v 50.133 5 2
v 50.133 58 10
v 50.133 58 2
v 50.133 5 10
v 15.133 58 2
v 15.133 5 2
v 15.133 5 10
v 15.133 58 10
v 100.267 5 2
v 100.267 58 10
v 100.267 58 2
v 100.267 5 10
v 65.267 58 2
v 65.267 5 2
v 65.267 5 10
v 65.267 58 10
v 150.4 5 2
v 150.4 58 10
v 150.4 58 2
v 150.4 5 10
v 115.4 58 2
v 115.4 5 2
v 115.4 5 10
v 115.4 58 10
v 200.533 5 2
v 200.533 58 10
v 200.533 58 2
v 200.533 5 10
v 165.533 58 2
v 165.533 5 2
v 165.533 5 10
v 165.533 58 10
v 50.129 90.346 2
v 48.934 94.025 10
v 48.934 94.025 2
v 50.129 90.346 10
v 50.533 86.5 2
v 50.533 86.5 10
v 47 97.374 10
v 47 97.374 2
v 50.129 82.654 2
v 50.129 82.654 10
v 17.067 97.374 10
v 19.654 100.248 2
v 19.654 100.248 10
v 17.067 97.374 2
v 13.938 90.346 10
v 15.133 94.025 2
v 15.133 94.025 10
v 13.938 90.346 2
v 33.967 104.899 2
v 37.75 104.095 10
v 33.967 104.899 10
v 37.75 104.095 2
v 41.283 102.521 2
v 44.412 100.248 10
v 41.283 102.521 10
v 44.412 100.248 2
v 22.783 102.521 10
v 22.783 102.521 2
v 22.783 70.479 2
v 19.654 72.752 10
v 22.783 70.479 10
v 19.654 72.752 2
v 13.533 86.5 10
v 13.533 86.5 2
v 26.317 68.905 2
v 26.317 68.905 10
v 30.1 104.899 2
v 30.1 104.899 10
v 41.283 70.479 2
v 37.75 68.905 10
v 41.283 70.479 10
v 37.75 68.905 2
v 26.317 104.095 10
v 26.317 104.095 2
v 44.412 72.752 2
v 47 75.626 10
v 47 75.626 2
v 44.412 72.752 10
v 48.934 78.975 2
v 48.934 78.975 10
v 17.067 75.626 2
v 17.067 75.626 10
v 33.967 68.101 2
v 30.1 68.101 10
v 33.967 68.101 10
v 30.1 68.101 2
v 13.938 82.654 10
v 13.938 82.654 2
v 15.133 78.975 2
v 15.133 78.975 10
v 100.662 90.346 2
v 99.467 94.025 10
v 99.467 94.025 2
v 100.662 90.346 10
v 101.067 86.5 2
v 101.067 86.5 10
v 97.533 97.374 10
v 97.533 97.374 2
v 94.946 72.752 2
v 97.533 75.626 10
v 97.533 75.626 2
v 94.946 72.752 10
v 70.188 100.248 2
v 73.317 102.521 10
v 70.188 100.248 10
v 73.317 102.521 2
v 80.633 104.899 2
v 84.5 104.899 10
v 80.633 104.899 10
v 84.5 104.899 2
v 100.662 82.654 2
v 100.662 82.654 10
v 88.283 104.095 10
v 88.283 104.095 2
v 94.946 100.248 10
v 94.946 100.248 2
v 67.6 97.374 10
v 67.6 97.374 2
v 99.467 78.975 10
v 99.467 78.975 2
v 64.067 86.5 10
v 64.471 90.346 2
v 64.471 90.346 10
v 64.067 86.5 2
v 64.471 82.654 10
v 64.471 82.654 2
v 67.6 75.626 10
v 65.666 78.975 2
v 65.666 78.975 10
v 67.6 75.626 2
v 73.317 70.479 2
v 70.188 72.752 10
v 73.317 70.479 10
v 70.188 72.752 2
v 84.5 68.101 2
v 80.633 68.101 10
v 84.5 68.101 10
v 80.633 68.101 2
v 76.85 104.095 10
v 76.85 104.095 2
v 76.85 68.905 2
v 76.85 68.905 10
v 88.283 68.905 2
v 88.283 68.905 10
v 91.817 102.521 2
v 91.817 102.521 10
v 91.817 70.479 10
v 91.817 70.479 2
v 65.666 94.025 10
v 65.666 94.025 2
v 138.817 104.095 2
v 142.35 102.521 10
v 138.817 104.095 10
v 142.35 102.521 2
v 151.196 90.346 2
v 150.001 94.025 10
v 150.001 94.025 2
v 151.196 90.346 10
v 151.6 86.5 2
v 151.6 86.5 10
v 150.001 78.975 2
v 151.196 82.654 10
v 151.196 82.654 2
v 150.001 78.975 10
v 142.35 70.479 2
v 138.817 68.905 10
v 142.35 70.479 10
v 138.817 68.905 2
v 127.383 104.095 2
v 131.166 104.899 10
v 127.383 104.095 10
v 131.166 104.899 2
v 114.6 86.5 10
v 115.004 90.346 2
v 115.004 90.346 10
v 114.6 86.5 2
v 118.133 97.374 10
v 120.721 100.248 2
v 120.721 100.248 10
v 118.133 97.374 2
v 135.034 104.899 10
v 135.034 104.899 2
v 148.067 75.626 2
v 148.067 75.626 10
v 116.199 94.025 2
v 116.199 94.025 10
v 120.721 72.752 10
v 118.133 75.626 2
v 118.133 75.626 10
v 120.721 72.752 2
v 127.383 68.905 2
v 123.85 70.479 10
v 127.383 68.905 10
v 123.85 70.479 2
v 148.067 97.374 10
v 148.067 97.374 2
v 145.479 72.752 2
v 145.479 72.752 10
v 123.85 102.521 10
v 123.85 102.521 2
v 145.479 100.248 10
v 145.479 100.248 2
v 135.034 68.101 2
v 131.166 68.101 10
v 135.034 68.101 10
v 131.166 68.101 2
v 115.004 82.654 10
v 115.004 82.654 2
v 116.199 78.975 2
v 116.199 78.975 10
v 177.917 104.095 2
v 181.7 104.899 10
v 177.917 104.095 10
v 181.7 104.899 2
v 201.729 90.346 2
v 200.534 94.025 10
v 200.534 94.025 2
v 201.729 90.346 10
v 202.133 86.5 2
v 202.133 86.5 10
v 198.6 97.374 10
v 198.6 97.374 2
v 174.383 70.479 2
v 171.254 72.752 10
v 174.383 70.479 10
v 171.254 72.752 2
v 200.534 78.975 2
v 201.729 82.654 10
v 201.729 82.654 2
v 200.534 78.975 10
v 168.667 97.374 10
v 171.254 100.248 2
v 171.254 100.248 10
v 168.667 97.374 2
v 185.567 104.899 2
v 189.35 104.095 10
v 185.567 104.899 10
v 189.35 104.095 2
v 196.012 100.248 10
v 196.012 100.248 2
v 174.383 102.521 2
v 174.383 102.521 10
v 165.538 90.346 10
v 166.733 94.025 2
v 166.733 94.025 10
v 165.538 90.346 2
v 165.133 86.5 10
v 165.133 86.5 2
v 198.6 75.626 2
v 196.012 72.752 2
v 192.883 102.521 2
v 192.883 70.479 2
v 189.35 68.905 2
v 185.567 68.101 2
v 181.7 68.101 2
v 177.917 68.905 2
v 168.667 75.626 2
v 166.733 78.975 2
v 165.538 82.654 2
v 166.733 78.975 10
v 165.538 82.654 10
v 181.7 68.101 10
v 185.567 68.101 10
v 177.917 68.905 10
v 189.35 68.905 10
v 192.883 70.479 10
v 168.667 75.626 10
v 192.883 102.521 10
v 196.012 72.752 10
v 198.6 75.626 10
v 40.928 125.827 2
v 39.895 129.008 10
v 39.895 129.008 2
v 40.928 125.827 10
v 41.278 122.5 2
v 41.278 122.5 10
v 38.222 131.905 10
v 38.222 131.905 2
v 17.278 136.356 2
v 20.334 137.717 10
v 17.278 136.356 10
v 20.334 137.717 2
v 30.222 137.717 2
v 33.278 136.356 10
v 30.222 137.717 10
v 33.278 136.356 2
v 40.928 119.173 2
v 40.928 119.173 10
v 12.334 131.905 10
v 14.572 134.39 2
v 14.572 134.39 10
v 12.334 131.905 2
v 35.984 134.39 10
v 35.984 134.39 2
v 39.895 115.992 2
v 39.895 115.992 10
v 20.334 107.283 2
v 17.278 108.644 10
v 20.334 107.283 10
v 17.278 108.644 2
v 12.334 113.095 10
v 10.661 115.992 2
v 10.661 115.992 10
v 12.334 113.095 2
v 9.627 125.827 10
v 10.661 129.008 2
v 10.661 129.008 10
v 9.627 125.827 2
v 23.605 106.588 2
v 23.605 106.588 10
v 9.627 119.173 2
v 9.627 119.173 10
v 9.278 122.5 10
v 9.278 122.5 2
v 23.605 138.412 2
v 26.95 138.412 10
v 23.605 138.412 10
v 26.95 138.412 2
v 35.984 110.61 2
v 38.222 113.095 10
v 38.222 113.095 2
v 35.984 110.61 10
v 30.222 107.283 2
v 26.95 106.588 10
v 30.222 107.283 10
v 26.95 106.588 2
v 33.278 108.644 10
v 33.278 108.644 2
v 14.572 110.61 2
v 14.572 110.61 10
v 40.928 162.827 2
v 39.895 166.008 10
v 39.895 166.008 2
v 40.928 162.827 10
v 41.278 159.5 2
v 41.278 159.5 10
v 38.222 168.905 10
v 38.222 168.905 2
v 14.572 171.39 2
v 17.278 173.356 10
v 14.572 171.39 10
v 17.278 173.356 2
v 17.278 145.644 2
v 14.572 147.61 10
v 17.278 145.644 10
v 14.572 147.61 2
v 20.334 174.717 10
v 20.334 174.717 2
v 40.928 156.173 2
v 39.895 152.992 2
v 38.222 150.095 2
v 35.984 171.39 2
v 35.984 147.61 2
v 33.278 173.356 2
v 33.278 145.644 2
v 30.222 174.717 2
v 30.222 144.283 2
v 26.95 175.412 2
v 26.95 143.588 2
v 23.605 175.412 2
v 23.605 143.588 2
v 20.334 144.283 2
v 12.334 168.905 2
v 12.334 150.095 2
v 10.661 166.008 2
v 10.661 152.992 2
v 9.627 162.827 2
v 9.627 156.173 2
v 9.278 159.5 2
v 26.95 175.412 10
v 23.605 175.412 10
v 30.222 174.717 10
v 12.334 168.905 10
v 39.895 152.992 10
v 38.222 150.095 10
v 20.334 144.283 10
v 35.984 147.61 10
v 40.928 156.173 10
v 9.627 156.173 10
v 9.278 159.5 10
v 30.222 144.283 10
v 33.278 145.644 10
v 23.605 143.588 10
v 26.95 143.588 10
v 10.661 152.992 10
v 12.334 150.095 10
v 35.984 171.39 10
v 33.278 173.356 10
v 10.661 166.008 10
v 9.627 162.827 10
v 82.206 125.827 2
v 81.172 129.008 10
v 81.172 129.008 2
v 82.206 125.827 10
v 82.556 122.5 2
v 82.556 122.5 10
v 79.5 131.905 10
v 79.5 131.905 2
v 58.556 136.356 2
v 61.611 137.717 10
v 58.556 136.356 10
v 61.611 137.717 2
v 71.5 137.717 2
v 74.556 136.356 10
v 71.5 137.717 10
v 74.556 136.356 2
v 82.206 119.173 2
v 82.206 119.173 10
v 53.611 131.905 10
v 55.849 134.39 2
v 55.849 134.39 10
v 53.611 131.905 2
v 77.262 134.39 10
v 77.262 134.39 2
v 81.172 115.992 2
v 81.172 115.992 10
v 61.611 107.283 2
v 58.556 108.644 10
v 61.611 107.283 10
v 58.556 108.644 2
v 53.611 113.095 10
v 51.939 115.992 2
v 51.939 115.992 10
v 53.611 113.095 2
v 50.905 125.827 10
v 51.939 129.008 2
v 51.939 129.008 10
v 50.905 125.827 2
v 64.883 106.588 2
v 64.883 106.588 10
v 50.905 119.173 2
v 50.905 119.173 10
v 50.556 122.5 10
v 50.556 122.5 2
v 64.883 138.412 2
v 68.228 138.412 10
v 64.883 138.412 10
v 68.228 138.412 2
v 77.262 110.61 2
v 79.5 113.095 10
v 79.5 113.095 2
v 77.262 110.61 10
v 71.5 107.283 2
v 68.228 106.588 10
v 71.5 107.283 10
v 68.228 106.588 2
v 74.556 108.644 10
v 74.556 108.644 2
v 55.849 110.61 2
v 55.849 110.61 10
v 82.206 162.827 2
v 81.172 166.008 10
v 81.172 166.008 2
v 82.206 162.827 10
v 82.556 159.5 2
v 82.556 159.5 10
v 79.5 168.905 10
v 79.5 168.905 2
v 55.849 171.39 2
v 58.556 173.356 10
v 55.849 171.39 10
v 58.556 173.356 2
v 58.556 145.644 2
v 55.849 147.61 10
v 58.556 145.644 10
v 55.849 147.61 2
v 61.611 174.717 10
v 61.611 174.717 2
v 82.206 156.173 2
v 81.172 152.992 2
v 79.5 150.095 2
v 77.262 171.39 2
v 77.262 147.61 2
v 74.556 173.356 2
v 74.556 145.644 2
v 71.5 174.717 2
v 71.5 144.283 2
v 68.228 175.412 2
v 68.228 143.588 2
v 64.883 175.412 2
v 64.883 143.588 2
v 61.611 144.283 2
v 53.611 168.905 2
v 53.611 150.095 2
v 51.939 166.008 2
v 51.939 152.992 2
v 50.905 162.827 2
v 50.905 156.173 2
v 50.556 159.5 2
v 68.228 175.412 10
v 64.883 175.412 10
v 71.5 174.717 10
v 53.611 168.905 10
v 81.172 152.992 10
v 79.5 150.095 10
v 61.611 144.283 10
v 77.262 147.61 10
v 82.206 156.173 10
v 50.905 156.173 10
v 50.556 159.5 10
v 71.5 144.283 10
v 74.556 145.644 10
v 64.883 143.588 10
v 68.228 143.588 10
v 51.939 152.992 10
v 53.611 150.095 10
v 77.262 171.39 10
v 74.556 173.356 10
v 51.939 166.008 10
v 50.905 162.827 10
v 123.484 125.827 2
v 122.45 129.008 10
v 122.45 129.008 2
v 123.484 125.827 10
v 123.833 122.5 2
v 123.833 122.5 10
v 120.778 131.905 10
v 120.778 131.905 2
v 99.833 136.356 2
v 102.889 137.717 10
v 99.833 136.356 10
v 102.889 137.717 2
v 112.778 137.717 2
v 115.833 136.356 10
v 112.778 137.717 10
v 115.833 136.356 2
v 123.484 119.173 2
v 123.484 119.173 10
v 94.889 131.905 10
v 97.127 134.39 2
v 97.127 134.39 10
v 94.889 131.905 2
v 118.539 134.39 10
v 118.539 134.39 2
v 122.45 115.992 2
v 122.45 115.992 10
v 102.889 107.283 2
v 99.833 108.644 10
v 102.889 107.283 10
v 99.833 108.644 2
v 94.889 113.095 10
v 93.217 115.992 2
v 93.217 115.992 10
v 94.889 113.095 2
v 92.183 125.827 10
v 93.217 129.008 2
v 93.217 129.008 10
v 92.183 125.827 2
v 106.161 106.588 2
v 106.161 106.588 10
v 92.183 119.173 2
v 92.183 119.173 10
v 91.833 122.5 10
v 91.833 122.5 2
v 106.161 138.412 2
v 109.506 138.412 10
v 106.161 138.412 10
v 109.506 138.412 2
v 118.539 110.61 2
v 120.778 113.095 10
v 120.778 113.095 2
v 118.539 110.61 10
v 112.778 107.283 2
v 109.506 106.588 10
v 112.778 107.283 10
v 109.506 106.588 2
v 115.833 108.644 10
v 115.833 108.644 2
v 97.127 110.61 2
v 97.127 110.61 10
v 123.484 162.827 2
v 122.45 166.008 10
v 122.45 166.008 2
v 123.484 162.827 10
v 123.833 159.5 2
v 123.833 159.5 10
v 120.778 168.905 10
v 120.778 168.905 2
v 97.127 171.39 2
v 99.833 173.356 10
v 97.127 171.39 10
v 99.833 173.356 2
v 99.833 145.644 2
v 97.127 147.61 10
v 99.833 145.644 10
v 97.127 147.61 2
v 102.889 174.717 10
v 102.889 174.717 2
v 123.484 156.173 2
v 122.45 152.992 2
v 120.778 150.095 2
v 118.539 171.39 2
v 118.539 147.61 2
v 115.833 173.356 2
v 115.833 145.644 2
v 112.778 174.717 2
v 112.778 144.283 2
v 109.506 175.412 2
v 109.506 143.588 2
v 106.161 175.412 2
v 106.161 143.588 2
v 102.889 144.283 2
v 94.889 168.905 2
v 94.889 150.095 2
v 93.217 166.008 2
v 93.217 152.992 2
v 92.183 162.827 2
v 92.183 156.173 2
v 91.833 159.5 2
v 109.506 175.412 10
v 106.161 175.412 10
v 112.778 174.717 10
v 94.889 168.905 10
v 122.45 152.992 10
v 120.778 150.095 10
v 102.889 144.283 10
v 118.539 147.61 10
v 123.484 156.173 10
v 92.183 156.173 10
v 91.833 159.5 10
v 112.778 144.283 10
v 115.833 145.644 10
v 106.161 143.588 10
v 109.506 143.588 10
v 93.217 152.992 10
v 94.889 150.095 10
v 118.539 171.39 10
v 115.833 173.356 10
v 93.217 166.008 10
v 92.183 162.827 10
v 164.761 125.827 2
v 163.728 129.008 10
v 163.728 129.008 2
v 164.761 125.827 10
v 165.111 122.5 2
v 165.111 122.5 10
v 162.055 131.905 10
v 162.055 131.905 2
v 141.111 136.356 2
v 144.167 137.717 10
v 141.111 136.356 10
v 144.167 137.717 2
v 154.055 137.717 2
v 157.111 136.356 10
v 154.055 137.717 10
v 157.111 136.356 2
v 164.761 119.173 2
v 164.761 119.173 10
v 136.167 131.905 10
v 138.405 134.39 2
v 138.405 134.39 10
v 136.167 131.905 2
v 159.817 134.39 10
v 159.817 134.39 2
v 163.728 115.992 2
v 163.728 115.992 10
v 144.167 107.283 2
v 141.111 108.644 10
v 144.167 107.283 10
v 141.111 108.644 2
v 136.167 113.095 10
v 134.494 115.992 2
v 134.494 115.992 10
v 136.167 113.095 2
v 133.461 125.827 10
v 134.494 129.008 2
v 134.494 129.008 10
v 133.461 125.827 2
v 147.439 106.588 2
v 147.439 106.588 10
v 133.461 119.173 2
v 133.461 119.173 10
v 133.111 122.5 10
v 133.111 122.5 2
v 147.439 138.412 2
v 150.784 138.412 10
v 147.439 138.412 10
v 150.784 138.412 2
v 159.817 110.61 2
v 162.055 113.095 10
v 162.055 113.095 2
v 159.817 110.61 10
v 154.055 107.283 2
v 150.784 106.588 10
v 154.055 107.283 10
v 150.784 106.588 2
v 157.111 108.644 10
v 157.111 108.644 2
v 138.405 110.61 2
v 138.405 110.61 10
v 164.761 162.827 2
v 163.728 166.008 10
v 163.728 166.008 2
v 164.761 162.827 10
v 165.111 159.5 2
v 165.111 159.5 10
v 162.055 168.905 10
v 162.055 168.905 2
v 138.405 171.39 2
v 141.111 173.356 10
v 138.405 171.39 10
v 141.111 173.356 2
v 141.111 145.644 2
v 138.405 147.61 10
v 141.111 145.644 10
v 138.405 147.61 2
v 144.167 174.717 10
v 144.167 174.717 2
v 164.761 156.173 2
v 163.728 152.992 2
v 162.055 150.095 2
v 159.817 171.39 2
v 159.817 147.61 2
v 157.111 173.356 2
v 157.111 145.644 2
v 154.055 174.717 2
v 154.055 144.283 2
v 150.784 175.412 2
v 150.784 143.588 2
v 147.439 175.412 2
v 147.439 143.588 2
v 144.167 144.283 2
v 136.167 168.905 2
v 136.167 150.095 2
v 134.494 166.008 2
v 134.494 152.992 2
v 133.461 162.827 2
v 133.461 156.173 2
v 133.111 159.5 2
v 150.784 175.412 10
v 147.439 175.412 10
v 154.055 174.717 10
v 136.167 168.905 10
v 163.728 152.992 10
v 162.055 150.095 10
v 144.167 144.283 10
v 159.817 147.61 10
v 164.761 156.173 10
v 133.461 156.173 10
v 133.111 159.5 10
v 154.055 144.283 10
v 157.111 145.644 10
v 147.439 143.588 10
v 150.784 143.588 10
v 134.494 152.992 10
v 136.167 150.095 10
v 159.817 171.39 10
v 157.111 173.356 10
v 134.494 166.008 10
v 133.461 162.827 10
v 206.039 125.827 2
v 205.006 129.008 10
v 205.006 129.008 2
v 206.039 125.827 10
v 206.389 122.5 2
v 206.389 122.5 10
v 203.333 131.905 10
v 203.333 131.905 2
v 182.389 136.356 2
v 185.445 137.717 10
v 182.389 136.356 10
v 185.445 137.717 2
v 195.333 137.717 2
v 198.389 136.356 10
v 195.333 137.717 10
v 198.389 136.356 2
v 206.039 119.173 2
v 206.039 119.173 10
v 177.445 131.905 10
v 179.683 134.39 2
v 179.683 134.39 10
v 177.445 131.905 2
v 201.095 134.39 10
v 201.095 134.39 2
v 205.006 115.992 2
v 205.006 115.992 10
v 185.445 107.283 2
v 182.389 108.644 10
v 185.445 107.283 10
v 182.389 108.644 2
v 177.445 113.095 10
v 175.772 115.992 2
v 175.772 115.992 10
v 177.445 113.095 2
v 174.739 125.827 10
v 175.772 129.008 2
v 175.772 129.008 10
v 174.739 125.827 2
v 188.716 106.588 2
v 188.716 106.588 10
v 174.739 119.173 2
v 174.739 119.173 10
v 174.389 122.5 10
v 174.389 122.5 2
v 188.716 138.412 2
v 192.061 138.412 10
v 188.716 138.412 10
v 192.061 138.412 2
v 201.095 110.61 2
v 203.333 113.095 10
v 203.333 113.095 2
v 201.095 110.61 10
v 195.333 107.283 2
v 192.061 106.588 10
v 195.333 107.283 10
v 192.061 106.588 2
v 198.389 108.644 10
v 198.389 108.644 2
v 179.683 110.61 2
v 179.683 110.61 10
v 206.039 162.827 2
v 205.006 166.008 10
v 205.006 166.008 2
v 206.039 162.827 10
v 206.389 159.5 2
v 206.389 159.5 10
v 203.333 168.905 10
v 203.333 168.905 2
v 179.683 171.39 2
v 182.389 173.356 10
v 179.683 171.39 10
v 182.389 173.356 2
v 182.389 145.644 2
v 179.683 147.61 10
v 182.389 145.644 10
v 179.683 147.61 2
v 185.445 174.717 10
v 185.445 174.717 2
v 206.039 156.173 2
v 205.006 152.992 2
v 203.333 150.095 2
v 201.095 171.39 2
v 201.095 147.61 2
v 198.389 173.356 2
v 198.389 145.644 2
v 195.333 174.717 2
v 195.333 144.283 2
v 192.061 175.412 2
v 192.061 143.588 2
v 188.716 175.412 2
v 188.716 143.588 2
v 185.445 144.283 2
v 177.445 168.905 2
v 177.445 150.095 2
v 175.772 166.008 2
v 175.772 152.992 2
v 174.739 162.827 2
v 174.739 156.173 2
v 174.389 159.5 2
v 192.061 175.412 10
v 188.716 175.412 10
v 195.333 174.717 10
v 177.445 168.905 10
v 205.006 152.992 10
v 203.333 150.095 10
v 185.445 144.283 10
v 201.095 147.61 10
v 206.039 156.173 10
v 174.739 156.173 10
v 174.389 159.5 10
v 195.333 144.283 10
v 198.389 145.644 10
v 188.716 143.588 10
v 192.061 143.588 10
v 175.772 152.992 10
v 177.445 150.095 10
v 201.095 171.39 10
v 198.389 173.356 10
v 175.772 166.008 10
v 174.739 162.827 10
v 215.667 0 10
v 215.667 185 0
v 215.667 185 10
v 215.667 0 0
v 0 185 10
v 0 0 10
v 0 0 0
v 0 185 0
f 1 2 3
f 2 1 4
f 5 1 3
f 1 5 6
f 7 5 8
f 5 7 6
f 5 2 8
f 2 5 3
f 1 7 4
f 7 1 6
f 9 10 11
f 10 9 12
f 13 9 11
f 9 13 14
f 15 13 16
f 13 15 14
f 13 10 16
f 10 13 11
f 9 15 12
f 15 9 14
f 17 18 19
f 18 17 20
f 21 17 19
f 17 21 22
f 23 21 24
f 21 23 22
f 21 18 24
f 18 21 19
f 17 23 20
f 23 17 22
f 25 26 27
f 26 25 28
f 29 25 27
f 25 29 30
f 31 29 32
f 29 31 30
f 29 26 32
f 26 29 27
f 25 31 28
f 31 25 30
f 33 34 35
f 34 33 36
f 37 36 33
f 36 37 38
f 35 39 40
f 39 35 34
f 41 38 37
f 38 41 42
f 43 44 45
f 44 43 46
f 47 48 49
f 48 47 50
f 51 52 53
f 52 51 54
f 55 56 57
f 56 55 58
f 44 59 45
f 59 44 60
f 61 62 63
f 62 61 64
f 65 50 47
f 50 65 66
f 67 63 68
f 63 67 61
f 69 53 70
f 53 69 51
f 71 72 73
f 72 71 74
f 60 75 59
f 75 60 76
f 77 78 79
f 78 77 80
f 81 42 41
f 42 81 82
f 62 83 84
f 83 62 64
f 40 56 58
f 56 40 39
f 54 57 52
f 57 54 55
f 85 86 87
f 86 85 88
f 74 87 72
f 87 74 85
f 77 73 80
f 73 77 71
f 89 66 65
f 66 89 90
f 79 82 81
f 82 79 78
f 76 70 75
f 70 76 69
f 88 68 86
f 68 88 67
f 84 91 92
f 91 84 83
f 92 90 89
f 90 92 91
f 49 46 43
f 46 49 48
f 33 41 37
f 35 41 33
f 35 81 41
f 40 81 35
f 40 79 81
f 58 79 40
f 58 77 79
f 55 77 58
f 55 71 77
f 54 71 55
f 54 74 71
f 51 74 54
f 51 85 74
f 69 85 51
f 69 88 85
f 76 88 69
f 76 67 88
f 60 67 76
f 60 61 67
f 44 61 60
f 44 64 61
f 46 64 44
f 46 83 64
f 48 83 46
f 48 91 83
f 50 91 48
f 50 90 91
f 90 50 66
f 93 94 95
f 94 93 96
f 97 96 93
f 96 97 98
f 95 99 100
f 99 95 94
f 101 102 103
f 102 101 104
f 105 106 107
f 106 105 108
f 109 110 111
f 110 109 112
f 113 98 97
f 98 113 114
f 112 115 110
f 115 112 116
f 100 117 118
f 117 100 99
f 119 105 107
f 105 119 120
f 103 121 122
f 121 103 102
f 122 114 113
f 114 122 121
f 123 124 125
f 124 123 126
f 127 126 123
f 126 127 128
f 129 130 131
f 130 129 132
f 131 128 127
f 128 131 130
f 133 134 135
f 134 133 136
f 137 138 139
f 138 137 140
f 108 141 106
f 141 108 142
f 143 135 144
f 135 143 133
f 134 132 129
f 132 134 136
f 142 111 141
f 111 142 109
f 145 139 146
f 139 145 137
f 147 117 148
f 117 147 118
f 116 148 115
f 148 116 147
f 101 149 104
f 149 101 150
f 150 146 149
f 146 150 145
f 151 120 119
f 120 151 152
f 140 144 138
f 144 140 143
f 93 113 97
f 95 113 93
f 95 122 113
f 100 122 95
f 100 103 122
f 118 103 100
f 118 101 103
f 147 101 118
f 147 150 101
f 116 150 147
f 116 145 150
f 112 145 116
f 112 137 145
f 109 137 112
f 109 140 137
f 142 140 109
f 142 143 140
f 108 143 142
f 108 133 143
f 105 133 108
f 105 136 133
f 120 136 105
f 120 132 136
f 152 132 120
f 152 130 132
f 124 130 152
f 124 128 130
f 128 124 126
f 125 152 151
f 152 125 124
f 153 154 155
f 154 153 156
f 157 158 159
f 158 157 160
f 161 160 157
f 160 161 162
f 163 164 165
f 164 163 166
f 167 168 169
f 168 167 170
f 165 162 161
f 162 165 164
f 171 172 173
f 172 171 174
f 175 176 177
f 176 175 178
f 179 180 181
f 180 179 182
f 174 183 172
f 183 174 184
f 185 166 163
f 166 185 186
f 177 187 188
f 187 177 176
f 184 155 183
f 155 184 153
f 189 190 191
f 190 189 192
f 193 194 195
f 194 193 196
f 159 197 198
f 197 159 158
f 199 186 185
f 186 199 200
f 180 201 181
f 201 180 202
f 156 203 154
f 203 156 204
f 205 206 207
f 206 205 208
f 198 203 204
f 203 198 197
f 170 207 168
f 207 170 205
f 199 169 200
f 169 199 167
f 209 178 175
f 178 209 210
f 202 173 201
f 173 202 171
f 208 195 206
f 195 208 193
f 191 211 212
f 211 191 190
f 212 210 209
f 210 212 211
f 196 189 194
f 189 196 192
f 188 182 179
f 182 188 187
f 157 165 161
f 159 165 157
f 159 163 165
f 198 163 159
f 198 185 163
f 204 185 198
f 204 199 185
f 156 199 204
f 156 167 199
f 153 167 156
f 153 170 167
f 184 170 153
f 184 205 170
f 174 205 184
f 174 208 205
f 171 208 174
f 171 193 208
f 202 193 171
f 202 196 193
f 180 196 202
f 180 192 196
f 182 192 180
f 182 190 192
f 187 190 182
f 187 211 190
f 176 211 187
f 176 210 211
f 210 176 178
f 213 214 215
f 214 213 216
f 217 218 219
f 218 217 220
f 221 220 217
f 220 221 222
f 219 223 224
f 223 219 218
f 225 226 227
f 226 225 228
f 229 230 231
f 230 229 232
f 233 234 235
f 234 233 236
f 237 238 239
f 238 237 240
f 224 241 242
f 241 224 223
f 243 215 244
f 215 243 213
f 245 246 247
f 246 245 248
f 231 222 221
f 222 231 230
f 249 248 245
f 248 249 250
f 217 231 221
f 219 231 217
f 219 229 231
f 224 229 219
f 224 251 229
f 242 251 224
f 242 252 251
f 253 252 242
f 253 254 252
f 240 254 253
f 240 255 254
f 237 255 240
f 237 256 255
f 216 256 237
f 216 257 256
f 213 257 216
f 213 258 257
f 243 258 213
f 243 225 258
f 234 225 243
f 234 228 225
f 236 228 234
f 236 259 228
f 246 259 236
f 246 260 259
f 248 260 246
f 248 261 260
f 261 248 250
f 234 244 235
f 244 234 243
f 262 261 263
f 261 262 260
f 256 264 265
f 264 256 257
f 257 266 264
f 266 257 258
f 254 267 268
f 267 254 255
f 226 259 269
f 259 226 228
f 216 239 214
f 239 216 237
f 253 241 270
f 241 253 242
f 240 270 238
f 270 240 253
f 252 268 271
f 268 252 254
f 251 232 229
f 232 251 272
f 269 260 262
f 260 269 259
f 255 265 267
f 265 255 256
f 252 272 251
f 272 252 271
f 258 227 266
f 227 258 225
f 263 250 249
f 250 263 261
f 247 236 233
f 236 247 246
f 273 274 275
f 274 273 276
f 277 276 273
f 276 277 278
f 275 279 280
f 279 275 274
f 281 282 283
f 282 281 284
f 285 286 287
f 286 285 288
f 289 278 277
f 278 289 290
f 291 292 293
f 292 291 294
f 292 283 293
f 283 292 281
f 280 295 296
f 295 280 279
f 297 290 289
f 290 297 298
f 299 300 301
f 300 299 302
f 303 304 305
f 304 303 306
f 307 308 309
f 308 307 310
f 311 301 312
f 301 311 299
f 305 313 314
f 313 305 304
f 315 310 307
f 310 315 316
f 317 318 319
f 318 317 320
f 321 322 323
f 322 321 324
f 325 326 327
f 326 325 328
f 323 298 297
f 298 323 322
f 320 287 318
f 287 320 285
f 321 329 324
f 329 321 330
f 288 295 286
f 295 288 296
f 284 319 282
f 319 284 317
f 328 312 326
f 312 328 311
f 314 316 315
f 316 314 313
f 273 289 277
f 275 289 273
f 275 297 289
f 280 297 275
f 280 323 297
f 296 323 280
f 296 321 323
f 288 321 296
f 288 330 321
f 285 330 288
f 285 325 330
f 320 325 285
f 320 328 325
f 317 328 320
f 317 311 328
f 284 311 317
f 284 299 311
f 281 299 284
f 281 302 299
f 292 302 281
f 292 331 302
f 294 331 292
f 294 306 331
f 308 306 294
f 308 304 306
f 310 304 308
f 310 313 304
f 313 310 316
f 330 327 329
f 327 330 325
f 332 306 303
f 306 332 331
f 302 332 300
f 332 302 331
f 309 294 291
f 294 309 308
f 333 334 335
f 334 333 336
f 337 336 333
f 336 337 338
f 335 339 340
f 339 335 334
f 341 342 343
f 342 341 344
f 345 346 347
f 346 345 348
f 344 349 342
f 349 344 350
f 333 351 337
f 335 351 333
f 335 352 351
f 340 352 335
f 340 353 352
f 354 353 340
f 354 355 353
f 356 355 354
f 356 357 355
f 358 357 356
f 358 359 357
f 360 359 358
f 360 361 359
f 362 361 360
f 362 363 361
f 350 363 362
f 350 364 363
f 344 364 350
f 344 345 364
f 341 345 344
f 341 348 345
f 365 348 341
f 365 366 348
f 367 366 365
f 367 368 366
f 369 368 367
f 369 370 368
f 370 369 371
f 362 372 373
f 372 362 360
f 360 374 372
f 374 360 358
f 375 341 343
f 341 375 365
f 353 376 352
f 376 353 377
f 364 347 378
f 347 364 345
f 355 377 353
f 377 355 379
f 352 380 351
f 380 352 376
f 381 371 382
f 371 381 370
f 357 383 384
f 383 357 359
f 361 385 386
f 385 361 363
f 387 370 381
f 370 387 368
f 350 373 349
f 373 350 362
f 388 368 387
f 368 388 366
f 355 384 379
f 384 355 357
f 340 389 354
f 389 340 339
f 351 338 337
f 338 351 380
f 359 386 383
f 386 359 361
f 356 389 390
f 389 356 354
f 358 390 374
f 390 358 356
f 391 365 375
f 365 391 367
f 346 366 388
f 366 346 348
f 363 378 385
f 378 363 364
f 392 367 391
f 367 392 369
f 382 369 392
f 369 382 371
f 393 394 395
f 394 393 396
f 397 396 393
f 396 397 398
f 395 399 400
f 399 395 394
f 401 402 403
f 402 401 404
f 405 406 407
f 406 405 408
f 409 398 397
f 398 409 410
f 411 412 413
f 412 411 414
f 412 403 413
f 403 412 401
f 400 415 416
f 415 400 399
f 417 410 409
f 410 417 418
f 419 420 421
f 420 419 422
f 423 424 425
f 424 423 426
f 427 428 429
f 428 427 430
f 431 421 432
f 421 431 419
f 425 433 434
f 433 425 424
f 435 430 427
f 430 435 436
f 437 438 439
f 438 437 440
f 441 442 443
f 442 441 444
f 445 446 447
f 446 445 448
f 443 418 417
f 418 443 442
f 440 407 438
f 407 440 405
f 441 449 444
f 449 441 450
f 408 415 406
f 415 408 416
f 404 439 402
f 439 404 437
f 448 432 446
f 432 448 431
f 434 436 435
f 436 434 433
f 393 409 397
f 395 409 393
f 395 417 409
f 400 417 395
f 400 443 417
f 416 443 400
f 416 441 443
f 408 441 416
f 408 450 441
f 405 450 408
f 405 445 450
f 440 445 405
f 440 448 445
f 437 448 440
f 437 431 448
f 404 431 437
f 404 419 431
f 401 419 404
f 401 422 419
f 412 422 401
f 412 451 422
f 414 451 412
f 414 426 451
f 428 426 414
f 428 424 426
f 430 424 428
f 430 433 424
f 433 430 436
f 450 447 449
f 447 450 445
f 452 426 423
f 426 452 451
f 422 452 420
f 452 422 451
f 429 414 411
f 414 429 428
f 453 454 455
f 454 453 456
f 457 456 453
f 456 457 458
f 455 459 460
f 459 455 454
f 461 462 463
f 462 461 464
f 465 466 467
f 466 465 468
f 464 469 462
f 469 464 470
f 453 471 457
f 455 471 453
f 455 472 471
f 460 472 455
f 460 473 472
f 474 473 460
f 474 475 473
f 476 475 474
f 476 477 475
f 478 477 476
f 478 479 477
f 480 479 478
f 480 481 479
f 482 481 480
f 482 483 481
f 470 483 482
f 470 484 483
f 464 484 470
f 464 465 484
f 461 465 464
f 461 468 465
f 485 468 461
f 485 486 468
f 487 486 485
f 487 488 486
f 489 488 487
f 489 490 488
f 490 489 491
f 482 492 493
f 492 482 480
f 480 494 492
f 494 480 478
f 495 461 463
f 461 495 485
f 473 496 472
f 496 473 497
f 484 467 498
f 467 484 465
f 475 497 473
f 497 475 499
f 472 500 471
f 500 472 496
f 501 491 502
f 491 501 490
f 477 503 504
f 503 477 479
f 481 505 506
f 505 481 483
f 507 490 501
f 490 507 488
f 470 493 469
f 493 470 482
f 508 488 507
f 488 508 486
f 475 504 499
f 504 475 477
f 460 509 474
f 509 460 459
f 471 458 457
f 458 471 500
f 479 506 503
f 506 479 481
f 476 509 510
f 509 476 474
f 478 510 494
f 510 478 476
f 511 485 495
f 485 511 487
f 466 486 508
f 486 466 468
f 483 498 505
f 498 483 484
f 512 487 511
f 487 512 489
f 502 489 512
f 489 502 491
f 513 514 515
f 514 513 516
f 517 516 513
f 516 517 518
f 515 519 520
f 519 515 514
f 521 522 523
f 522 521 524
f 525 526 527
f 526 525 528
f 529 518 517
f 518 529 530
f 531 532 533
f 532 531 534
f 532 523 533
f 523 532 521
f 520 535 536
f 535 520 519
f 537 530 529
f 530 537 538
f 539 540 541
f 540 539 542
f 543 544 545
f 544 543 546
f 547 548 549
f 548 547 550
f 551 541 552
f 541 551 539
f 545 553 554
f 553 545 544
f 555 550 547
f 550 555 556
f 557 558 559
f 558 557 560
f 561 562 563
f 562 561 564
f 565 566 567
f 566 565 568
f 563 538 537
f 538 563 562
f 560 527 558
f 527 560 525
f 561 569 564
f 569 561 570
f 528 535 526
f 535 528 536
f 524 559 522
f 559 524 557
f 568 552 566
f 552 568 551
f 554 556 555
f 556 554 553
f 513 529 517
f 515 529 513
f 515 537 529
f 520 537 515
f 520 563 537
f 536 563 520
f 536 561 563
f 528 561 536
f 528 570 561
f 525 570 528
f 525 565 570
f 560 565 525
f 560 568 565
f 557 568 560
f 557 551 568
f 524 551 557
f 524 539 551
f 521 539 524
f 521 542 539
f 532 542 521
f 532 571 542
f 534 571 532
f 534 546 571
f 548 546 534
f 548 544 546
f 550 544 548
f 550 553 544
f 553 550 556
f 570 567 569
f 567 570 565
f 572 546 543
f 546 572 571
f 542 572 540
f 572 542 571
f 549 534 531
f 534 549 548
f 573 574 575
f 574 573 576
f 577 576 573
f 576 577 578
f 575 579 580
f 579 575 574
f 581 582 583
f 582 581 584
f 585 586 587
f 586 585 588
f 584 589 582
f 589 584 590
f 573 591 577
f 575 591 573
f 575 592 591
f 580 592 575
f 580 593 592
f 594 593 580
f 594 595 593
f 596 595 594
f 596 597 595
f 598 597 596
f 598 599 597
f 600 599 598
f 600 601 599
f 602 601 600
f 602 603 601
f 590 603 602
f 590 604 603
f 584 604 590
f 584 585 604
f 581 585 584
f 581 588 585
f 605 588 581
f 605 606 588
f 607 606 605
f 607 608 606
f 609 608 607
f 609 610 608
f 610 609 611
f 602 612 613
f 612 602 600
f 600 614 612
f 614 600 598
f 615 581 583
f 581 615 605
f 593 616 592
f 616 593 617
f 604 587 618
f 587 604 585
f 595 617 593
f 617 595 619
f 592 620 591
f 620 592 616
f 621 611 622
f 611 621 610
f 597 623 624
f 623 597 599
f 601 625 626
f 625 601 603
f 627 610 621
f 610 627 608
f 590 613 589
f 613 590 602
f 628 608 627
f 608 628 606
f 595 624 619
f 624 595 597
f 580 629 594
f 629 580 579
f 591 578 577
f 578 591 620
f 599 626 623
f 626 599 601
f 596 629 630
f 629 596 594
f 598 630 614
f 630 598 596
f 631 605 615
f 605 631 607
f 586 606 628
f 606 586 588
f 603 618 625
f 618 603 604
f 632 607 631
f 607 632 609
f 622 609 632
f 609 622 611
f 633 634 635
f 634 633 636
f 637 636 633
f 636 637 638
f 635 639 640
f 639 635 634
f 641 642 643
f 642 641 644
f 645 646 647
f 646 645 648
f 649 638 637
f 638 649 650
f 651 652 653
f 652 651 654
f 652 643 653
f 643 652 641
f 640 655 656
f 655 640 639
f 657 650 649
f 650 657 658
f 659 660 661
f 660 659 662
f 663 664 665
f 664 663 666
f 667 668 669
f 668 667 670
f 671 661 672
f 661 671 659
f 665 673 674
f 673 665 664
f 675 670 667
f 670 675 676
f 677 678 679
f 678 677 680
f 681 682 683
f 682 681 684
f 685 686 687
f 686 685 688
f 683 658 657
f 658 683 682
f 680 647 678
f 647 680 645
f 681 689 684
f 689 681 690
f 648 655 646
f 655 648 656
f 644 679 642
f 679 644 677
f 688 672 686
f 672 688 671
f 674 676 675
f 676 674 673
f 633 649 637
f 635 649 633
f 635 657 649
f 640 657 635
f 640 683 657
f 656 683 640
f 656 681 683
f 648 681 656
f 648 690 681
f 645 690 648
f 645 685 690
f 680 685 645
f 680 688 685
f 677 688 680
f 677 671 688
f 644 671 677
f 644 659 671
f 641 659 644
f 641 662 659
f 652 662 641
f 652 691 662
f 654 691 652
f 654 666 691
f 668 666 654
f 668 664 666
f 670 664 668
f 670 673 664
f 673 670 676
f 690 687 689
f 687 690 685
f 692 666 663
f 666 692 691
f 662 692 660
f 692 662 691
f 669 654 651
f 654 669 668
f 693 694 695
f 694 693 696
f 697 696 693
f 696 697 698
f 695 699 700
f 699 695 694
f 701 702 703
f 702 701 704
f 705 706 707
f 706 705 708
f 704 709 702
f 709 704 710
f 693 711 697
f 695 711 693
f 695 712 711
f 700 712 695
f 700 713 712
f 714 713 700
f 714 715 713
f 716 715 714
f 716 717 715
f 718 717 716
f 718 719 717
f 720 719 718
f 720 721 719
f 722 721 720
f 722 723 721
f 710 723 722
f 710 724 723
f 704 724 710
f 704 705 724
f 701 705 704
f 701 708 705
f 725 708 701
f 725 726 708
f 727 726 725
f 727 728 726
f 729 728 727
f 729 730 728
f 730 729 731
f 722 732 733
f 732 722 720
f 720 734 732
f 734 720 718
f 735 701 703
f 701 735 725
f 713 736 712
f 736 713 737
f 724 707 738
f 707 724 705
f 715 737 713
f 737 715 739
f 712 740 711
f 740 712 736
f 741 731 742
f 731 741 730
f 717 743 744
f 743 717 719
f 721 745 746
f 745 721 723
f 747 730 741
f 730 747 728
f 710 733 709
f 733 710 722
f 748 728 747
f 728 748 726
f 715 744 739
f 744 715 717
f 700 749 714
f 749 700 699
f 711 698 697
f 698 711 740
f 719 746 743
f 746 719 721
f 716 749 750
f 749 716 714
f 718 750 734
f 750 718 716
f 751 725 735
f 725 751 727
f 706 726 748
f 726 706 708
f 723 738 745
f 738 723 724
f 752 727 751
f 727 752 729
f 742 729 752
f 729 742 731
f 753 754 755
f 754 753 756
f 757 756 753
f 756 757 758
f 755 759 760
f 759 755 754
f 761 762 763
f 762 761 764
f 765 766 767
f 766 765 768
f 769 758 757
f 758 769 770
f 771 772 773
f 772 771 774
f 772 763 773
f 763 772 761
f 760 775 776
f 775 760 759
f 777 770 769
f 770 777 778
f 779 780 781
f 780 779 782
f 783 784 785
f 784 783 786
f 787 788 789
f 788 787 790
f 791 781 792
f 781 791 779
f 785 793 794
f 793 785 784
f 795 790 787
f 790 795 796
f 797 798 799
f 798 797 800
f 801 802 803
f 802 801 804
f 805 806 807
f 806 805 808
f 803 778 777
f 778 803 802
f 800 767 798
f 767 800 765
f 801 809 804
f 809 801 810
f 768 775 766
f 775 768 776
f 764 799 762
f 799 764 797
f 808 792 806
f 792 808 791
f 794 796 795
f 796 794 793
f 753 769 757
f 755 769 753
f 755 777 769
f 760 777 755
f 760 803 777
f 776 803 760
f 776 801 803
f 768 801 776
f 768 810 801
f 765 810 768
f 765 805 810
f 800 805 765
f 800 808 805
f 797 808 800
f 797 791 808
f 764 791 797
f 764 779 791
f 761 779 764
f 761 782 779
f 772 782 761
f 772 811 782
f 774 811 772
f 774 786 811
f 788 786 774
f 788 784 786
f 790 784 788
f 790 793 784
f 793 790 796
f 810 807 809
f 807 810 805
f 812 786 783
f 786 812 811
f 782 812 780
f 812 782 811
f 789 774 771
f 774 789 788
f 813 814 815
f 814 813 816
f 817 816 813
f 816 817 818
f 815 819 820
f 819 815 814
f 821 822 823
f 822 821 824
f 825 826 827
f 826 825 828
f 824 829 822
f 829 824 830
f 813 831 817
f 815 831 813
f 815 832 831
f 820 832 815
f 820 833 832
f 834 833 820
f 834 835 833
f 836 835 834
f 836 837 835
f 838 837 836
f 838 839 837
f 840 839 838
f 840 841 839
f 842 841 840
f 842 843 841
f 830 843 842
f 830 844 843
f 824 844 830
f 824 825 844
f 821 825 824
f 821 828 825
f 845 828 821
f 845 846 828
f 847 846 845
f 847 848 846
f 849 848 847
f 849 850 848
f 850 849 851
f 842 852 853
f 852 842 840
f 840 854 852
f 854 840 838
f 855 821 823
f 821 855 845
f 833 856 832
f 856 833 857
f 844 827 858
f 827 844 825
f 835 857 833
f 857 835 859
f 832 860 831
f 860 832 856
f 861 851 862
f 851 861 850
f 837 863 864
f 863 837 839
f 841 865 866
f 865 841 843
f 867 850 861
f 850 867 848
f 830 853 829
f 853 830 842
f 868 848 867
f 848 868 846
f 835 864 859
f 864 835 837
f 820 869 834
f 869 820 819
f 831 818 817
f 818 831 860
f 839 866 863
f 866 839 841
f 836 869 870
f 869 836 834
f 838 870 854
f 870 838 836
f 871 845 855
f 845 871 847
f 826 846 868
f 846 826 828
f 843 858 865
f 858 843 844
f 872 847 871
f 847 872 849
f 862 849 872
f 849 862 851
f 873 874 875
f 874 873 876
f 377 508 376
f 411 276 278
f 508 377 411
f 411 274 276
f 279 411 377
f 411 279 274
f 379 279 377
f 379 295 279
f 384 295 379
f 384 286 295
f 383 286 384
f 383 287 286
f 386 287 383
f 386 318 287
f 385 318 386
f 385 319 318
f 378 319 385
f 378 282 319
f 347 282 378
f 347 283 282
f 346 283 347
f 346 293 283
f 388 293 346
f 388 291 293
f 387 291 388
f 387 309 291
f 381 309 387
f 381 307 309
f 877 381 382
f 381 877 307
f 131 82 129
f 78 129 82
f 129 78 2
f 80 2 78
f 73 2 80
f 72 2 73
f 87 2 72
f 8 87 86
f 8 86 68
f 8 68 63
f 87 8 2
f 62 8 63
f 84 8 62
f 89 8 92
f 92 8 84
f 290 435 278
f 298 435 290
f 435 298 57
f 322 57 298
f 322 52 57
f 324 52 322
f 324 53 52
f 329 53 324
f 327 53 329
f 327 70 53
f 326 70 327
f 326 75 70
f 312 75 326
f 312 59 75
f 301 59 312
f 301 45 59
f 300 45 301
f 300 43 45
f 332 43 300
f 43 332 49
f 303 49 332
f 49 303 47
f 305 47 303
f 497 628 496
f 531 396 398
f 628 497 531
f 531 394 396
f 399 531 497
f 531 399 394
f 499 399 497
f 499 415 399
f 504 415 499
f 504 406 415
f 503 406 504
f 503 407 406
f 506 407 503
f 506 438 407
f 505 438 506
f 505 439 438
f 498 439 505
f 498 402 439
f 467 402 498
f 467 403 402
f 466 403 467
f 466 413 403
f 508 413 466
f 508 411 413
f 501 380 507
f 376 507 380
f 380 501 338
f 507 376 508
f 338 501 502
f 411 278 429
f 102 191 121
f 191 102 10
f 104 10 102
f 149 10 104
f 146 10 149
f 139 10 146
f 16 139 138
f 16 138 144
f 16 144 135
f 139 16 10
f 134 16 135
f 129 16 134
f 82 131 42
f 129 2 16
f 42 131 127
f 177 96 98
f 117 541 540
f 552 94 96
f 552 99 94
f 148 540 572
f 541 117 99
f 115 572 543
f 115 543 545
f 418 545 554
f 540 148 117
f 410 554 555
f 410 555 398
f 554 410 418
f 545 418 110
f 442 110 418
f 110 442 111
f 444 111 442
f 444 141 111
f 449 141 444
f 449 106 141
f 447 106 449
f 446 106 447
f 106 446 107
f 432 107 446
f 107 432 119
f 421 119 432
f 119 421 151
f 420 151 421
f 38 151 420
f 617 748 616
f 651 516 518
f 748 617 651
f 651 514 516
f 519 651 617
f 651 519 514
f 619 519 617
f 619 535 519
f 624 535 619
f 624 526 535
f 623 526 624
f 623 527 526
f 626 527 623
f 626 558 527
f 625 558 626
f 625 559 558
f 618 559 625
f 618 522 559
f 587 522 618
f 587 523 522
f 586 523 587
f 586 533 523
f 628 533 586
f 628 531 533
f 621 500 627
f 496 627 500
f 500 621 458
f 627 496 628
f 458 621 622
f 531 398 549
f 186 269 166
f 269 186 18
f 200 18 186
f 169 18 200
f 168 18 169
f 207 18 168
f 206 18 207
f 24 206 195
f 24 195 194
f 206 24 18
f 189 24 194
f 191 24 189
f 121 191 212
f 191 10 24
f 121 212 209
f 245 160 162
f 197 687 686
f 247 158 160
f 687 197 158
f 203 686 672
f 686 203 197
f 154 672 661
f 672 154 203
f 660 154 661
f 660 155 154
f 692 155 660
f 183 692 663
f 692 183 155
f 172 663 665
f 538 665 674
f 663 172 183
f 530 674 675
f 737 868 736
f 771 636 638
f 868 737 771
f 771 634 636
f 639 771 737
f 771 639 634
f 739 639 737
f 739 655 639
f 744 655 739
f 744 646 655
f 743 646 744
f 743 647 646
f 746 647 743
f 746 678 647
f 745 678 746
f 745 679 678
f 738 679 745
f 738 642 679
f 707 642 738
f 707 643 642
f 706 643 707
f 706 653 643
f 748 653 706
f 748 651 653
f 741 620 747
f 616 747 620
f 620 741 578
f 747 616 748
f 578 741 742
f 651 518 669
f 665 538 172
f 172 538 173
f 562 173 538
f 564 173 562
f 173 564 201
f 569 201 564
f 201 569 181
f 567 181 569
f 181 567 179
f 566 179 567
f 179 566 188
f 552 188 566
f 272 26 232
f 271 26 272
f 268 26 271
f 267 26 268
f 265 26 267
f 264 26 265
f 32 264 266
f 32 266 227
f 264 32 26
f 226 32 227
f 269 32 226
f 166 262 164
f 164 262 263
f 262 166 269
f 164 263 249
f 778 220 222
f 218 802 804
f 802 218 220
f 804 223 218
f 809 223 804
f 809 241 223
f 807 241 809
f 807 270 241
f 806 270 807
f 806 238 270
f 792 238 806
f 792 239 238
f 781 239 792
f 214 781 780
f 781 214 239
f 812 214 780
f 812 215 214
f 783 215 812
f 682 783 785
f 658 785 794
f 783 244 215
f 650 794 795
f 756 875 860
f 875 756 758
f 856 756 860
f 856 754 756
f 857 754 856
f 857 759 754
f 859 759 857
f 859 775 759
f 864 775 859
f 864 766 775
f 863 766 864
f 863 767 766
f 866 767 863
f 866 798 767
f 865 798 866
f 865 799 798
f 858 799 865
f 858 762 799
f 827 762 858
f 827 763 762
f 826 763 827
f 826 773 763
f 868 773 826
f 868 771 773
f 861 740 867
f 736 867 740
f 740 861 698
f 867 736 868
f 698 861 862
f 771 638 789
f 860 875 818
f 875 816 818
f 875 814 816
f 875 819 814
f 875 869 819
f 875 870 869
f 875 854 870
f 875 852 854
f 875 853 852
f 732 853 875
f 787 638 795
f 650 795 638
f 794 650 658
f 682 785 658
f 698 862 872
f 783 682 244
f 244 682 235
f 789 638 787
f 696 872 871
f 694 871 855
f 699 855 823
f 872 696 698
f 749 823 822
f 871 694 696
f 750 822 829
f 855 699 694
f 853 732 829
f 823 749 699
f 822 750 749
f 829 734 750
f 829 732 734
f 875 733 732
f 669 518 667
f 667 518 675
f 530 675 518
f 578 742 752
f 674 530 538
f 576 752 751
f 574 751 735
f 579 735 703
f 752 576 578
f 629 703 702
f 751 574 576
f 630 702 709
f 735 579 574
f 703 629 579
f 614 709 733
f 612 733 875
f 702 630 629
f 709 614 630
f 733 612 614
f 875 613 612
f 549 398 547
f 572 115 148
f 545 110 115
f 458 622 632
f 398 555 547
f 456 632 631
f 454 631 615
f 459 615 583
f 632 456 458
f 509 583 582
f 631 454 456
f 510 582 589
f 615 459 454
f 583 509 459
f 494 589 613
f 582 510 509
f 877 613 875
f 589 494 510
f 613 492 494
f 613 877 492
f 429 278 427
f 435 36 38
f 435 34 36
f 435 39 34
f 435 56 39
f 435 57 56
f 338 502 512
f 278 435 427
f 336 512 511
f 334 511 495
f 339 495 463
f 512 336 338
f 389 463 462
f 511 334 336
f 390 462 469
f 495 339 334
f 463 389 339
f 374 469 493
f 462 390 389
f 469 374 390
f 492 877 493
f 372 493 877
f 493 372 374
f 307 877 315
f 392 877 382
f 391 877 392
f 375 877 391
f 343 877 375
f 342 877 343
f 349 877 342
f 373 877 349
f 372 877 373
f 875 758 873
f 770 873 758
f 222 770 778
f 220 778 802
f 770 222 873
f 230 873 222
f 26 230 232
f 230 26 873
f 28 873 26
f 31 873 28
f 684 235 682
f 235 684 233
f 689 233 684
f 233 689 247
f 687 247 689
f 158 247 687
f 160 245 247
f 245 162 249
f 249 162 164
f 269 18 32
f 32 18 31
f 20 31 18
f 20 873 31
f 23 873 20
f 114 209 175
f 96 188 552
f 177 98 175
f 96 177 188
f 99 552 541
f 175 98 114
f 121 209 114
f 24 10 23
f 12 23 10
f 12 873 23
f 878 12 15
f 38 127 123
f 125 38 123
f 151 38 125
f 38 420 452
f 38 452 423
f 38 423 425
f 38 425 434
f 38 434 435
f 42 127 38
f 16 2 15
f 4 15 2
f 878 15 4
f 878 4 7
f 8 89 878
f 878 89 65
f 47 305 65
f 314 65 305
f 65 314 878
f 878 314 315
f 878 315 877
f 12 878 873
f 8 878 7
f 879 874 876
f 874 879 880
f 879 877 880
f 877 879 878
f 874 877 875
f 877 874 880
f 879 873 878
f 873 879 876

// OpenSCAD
drawer_width = 647;
drawer_height = 370;
base_x = drawer_width/3;
base_y = drawer_height/2;
base_thickness = 10;
base_floor = 2; 
depth = base_thickness - base_floor;
small_bottle_diameter = 32;
medium_bottle_diameter = 37;
big_bottle_x = 35;
big_bottle_y = 53;
big_bottle_cap = 10;
big_bottle_qty = 4;

bottom_margin = 5;
spacing_y = 5;

big_bottle_spacing_x = (base_x - (big_bottle_qty * big_bottle_x))/(big_bottle_qty + 1);

medium_bottle_spacing_y = spacing_y + big_bottle_y+(2*spacing_y+medium_bottle_diameter/2);
medium_spacing = (base_x - 4*medium_bottle_diameter)/5;

function small_bottle_x(bottle_number) = (small_bottle_spacing_y+small_bottle_diameter/2)+(small_bottle_spacing_y+(small_bottle_diameter))*bottle_number;

small_bottle_y = medium_bottle_spacing_y+medium_bottle_diameter+spacing_y-6;
small_bottle_spacing_y = (base_x - 5*small_bottle_diameter)/6;
small_bottle_y2 = small_bottle_diameter+spacing_y;

function medium_bottle_x(bottle_number) = (medium_spacing+medium_bottle_diameter/2)+(medium_spacing+(medium_bottle_diameter))*bottle_number;

difference() {
  cube([base_x,base_y,base_thickness]);
  big_bottles();
  medium_bottles();
  small_bottles();
}

module small_bottles() {
  translate([small_bottle_x(0),small_bottle_y,0]) { 
    small_bottle_pair();
  }
  translate([small_bottle_x(1),small_bottle_y,0]) {
    small_bottle_pair();
  }
  translate([small_bottle_x(2),small_bottle_y,0]) {
    small_bottle_pair();
  }
  translate([small_bottle_x(3),small_bottle_y,0]) {
    small_bottle_pair();
  }
  translate([small_bottle_x(4),small_bottle_y,0]) {
    small_bottle_pair();
  }
}

module small_bottle_pair() {
  color("orange") {
    translate([0,0,2]) {
    cylinder(h=10, d=small_bottle_diameter);
    }
    translate([0,small_bottle_y2,2]) {
    cylinder(h=10, d=small_bottle_diameter);
    }
  }
}

module medium_bottles() {
  translate([medium_bottle_x(0),medium_bottle_spacing_y,0]) {
    medium_bottle();
  }
  translate([medium_bottle_x(1),medium_bottle_spacing_y,0]) {
    medium_bottle();
  }
  translate([medium_bottle_x(2),medium_bottle_spacing_y,0]) {
    medium_bottle();
  }
  translate([medium_bottle_x(3),medium_bottle_spacing_y,0]) {
    medium_bottle();
  }
}

module medium_bottle() {
  color("purple") {
    translate([0,0,2]) {
      cylinder(h=10, d=medium_bottle_diameter);
    }
  }
}

module big_bottles() {
  translate([big_bottle_spacing_x,bottom_margin,0]) {
    big_bottle();
  }
  translate([big_bottle_x+(2*big_bottle_spacing_x),bottom_margin,0]) {
    big_bottle();
  }
  translate([(2*big_bottle_x)+(3*big_bottle_spacing_x),bottom_margin,0]) {
    big_bottle();
  }
  translate([(3*big_bottle_x)+(4*big_bottle_spacing_x),bottom_margin,0]) {
    big_bottle();
  }
}

module big_bottle() {
  translate([0,0,base_floor]) {
    cube([big_bottle_x,big_bottle_y,base_thickness]);  
  }
}
